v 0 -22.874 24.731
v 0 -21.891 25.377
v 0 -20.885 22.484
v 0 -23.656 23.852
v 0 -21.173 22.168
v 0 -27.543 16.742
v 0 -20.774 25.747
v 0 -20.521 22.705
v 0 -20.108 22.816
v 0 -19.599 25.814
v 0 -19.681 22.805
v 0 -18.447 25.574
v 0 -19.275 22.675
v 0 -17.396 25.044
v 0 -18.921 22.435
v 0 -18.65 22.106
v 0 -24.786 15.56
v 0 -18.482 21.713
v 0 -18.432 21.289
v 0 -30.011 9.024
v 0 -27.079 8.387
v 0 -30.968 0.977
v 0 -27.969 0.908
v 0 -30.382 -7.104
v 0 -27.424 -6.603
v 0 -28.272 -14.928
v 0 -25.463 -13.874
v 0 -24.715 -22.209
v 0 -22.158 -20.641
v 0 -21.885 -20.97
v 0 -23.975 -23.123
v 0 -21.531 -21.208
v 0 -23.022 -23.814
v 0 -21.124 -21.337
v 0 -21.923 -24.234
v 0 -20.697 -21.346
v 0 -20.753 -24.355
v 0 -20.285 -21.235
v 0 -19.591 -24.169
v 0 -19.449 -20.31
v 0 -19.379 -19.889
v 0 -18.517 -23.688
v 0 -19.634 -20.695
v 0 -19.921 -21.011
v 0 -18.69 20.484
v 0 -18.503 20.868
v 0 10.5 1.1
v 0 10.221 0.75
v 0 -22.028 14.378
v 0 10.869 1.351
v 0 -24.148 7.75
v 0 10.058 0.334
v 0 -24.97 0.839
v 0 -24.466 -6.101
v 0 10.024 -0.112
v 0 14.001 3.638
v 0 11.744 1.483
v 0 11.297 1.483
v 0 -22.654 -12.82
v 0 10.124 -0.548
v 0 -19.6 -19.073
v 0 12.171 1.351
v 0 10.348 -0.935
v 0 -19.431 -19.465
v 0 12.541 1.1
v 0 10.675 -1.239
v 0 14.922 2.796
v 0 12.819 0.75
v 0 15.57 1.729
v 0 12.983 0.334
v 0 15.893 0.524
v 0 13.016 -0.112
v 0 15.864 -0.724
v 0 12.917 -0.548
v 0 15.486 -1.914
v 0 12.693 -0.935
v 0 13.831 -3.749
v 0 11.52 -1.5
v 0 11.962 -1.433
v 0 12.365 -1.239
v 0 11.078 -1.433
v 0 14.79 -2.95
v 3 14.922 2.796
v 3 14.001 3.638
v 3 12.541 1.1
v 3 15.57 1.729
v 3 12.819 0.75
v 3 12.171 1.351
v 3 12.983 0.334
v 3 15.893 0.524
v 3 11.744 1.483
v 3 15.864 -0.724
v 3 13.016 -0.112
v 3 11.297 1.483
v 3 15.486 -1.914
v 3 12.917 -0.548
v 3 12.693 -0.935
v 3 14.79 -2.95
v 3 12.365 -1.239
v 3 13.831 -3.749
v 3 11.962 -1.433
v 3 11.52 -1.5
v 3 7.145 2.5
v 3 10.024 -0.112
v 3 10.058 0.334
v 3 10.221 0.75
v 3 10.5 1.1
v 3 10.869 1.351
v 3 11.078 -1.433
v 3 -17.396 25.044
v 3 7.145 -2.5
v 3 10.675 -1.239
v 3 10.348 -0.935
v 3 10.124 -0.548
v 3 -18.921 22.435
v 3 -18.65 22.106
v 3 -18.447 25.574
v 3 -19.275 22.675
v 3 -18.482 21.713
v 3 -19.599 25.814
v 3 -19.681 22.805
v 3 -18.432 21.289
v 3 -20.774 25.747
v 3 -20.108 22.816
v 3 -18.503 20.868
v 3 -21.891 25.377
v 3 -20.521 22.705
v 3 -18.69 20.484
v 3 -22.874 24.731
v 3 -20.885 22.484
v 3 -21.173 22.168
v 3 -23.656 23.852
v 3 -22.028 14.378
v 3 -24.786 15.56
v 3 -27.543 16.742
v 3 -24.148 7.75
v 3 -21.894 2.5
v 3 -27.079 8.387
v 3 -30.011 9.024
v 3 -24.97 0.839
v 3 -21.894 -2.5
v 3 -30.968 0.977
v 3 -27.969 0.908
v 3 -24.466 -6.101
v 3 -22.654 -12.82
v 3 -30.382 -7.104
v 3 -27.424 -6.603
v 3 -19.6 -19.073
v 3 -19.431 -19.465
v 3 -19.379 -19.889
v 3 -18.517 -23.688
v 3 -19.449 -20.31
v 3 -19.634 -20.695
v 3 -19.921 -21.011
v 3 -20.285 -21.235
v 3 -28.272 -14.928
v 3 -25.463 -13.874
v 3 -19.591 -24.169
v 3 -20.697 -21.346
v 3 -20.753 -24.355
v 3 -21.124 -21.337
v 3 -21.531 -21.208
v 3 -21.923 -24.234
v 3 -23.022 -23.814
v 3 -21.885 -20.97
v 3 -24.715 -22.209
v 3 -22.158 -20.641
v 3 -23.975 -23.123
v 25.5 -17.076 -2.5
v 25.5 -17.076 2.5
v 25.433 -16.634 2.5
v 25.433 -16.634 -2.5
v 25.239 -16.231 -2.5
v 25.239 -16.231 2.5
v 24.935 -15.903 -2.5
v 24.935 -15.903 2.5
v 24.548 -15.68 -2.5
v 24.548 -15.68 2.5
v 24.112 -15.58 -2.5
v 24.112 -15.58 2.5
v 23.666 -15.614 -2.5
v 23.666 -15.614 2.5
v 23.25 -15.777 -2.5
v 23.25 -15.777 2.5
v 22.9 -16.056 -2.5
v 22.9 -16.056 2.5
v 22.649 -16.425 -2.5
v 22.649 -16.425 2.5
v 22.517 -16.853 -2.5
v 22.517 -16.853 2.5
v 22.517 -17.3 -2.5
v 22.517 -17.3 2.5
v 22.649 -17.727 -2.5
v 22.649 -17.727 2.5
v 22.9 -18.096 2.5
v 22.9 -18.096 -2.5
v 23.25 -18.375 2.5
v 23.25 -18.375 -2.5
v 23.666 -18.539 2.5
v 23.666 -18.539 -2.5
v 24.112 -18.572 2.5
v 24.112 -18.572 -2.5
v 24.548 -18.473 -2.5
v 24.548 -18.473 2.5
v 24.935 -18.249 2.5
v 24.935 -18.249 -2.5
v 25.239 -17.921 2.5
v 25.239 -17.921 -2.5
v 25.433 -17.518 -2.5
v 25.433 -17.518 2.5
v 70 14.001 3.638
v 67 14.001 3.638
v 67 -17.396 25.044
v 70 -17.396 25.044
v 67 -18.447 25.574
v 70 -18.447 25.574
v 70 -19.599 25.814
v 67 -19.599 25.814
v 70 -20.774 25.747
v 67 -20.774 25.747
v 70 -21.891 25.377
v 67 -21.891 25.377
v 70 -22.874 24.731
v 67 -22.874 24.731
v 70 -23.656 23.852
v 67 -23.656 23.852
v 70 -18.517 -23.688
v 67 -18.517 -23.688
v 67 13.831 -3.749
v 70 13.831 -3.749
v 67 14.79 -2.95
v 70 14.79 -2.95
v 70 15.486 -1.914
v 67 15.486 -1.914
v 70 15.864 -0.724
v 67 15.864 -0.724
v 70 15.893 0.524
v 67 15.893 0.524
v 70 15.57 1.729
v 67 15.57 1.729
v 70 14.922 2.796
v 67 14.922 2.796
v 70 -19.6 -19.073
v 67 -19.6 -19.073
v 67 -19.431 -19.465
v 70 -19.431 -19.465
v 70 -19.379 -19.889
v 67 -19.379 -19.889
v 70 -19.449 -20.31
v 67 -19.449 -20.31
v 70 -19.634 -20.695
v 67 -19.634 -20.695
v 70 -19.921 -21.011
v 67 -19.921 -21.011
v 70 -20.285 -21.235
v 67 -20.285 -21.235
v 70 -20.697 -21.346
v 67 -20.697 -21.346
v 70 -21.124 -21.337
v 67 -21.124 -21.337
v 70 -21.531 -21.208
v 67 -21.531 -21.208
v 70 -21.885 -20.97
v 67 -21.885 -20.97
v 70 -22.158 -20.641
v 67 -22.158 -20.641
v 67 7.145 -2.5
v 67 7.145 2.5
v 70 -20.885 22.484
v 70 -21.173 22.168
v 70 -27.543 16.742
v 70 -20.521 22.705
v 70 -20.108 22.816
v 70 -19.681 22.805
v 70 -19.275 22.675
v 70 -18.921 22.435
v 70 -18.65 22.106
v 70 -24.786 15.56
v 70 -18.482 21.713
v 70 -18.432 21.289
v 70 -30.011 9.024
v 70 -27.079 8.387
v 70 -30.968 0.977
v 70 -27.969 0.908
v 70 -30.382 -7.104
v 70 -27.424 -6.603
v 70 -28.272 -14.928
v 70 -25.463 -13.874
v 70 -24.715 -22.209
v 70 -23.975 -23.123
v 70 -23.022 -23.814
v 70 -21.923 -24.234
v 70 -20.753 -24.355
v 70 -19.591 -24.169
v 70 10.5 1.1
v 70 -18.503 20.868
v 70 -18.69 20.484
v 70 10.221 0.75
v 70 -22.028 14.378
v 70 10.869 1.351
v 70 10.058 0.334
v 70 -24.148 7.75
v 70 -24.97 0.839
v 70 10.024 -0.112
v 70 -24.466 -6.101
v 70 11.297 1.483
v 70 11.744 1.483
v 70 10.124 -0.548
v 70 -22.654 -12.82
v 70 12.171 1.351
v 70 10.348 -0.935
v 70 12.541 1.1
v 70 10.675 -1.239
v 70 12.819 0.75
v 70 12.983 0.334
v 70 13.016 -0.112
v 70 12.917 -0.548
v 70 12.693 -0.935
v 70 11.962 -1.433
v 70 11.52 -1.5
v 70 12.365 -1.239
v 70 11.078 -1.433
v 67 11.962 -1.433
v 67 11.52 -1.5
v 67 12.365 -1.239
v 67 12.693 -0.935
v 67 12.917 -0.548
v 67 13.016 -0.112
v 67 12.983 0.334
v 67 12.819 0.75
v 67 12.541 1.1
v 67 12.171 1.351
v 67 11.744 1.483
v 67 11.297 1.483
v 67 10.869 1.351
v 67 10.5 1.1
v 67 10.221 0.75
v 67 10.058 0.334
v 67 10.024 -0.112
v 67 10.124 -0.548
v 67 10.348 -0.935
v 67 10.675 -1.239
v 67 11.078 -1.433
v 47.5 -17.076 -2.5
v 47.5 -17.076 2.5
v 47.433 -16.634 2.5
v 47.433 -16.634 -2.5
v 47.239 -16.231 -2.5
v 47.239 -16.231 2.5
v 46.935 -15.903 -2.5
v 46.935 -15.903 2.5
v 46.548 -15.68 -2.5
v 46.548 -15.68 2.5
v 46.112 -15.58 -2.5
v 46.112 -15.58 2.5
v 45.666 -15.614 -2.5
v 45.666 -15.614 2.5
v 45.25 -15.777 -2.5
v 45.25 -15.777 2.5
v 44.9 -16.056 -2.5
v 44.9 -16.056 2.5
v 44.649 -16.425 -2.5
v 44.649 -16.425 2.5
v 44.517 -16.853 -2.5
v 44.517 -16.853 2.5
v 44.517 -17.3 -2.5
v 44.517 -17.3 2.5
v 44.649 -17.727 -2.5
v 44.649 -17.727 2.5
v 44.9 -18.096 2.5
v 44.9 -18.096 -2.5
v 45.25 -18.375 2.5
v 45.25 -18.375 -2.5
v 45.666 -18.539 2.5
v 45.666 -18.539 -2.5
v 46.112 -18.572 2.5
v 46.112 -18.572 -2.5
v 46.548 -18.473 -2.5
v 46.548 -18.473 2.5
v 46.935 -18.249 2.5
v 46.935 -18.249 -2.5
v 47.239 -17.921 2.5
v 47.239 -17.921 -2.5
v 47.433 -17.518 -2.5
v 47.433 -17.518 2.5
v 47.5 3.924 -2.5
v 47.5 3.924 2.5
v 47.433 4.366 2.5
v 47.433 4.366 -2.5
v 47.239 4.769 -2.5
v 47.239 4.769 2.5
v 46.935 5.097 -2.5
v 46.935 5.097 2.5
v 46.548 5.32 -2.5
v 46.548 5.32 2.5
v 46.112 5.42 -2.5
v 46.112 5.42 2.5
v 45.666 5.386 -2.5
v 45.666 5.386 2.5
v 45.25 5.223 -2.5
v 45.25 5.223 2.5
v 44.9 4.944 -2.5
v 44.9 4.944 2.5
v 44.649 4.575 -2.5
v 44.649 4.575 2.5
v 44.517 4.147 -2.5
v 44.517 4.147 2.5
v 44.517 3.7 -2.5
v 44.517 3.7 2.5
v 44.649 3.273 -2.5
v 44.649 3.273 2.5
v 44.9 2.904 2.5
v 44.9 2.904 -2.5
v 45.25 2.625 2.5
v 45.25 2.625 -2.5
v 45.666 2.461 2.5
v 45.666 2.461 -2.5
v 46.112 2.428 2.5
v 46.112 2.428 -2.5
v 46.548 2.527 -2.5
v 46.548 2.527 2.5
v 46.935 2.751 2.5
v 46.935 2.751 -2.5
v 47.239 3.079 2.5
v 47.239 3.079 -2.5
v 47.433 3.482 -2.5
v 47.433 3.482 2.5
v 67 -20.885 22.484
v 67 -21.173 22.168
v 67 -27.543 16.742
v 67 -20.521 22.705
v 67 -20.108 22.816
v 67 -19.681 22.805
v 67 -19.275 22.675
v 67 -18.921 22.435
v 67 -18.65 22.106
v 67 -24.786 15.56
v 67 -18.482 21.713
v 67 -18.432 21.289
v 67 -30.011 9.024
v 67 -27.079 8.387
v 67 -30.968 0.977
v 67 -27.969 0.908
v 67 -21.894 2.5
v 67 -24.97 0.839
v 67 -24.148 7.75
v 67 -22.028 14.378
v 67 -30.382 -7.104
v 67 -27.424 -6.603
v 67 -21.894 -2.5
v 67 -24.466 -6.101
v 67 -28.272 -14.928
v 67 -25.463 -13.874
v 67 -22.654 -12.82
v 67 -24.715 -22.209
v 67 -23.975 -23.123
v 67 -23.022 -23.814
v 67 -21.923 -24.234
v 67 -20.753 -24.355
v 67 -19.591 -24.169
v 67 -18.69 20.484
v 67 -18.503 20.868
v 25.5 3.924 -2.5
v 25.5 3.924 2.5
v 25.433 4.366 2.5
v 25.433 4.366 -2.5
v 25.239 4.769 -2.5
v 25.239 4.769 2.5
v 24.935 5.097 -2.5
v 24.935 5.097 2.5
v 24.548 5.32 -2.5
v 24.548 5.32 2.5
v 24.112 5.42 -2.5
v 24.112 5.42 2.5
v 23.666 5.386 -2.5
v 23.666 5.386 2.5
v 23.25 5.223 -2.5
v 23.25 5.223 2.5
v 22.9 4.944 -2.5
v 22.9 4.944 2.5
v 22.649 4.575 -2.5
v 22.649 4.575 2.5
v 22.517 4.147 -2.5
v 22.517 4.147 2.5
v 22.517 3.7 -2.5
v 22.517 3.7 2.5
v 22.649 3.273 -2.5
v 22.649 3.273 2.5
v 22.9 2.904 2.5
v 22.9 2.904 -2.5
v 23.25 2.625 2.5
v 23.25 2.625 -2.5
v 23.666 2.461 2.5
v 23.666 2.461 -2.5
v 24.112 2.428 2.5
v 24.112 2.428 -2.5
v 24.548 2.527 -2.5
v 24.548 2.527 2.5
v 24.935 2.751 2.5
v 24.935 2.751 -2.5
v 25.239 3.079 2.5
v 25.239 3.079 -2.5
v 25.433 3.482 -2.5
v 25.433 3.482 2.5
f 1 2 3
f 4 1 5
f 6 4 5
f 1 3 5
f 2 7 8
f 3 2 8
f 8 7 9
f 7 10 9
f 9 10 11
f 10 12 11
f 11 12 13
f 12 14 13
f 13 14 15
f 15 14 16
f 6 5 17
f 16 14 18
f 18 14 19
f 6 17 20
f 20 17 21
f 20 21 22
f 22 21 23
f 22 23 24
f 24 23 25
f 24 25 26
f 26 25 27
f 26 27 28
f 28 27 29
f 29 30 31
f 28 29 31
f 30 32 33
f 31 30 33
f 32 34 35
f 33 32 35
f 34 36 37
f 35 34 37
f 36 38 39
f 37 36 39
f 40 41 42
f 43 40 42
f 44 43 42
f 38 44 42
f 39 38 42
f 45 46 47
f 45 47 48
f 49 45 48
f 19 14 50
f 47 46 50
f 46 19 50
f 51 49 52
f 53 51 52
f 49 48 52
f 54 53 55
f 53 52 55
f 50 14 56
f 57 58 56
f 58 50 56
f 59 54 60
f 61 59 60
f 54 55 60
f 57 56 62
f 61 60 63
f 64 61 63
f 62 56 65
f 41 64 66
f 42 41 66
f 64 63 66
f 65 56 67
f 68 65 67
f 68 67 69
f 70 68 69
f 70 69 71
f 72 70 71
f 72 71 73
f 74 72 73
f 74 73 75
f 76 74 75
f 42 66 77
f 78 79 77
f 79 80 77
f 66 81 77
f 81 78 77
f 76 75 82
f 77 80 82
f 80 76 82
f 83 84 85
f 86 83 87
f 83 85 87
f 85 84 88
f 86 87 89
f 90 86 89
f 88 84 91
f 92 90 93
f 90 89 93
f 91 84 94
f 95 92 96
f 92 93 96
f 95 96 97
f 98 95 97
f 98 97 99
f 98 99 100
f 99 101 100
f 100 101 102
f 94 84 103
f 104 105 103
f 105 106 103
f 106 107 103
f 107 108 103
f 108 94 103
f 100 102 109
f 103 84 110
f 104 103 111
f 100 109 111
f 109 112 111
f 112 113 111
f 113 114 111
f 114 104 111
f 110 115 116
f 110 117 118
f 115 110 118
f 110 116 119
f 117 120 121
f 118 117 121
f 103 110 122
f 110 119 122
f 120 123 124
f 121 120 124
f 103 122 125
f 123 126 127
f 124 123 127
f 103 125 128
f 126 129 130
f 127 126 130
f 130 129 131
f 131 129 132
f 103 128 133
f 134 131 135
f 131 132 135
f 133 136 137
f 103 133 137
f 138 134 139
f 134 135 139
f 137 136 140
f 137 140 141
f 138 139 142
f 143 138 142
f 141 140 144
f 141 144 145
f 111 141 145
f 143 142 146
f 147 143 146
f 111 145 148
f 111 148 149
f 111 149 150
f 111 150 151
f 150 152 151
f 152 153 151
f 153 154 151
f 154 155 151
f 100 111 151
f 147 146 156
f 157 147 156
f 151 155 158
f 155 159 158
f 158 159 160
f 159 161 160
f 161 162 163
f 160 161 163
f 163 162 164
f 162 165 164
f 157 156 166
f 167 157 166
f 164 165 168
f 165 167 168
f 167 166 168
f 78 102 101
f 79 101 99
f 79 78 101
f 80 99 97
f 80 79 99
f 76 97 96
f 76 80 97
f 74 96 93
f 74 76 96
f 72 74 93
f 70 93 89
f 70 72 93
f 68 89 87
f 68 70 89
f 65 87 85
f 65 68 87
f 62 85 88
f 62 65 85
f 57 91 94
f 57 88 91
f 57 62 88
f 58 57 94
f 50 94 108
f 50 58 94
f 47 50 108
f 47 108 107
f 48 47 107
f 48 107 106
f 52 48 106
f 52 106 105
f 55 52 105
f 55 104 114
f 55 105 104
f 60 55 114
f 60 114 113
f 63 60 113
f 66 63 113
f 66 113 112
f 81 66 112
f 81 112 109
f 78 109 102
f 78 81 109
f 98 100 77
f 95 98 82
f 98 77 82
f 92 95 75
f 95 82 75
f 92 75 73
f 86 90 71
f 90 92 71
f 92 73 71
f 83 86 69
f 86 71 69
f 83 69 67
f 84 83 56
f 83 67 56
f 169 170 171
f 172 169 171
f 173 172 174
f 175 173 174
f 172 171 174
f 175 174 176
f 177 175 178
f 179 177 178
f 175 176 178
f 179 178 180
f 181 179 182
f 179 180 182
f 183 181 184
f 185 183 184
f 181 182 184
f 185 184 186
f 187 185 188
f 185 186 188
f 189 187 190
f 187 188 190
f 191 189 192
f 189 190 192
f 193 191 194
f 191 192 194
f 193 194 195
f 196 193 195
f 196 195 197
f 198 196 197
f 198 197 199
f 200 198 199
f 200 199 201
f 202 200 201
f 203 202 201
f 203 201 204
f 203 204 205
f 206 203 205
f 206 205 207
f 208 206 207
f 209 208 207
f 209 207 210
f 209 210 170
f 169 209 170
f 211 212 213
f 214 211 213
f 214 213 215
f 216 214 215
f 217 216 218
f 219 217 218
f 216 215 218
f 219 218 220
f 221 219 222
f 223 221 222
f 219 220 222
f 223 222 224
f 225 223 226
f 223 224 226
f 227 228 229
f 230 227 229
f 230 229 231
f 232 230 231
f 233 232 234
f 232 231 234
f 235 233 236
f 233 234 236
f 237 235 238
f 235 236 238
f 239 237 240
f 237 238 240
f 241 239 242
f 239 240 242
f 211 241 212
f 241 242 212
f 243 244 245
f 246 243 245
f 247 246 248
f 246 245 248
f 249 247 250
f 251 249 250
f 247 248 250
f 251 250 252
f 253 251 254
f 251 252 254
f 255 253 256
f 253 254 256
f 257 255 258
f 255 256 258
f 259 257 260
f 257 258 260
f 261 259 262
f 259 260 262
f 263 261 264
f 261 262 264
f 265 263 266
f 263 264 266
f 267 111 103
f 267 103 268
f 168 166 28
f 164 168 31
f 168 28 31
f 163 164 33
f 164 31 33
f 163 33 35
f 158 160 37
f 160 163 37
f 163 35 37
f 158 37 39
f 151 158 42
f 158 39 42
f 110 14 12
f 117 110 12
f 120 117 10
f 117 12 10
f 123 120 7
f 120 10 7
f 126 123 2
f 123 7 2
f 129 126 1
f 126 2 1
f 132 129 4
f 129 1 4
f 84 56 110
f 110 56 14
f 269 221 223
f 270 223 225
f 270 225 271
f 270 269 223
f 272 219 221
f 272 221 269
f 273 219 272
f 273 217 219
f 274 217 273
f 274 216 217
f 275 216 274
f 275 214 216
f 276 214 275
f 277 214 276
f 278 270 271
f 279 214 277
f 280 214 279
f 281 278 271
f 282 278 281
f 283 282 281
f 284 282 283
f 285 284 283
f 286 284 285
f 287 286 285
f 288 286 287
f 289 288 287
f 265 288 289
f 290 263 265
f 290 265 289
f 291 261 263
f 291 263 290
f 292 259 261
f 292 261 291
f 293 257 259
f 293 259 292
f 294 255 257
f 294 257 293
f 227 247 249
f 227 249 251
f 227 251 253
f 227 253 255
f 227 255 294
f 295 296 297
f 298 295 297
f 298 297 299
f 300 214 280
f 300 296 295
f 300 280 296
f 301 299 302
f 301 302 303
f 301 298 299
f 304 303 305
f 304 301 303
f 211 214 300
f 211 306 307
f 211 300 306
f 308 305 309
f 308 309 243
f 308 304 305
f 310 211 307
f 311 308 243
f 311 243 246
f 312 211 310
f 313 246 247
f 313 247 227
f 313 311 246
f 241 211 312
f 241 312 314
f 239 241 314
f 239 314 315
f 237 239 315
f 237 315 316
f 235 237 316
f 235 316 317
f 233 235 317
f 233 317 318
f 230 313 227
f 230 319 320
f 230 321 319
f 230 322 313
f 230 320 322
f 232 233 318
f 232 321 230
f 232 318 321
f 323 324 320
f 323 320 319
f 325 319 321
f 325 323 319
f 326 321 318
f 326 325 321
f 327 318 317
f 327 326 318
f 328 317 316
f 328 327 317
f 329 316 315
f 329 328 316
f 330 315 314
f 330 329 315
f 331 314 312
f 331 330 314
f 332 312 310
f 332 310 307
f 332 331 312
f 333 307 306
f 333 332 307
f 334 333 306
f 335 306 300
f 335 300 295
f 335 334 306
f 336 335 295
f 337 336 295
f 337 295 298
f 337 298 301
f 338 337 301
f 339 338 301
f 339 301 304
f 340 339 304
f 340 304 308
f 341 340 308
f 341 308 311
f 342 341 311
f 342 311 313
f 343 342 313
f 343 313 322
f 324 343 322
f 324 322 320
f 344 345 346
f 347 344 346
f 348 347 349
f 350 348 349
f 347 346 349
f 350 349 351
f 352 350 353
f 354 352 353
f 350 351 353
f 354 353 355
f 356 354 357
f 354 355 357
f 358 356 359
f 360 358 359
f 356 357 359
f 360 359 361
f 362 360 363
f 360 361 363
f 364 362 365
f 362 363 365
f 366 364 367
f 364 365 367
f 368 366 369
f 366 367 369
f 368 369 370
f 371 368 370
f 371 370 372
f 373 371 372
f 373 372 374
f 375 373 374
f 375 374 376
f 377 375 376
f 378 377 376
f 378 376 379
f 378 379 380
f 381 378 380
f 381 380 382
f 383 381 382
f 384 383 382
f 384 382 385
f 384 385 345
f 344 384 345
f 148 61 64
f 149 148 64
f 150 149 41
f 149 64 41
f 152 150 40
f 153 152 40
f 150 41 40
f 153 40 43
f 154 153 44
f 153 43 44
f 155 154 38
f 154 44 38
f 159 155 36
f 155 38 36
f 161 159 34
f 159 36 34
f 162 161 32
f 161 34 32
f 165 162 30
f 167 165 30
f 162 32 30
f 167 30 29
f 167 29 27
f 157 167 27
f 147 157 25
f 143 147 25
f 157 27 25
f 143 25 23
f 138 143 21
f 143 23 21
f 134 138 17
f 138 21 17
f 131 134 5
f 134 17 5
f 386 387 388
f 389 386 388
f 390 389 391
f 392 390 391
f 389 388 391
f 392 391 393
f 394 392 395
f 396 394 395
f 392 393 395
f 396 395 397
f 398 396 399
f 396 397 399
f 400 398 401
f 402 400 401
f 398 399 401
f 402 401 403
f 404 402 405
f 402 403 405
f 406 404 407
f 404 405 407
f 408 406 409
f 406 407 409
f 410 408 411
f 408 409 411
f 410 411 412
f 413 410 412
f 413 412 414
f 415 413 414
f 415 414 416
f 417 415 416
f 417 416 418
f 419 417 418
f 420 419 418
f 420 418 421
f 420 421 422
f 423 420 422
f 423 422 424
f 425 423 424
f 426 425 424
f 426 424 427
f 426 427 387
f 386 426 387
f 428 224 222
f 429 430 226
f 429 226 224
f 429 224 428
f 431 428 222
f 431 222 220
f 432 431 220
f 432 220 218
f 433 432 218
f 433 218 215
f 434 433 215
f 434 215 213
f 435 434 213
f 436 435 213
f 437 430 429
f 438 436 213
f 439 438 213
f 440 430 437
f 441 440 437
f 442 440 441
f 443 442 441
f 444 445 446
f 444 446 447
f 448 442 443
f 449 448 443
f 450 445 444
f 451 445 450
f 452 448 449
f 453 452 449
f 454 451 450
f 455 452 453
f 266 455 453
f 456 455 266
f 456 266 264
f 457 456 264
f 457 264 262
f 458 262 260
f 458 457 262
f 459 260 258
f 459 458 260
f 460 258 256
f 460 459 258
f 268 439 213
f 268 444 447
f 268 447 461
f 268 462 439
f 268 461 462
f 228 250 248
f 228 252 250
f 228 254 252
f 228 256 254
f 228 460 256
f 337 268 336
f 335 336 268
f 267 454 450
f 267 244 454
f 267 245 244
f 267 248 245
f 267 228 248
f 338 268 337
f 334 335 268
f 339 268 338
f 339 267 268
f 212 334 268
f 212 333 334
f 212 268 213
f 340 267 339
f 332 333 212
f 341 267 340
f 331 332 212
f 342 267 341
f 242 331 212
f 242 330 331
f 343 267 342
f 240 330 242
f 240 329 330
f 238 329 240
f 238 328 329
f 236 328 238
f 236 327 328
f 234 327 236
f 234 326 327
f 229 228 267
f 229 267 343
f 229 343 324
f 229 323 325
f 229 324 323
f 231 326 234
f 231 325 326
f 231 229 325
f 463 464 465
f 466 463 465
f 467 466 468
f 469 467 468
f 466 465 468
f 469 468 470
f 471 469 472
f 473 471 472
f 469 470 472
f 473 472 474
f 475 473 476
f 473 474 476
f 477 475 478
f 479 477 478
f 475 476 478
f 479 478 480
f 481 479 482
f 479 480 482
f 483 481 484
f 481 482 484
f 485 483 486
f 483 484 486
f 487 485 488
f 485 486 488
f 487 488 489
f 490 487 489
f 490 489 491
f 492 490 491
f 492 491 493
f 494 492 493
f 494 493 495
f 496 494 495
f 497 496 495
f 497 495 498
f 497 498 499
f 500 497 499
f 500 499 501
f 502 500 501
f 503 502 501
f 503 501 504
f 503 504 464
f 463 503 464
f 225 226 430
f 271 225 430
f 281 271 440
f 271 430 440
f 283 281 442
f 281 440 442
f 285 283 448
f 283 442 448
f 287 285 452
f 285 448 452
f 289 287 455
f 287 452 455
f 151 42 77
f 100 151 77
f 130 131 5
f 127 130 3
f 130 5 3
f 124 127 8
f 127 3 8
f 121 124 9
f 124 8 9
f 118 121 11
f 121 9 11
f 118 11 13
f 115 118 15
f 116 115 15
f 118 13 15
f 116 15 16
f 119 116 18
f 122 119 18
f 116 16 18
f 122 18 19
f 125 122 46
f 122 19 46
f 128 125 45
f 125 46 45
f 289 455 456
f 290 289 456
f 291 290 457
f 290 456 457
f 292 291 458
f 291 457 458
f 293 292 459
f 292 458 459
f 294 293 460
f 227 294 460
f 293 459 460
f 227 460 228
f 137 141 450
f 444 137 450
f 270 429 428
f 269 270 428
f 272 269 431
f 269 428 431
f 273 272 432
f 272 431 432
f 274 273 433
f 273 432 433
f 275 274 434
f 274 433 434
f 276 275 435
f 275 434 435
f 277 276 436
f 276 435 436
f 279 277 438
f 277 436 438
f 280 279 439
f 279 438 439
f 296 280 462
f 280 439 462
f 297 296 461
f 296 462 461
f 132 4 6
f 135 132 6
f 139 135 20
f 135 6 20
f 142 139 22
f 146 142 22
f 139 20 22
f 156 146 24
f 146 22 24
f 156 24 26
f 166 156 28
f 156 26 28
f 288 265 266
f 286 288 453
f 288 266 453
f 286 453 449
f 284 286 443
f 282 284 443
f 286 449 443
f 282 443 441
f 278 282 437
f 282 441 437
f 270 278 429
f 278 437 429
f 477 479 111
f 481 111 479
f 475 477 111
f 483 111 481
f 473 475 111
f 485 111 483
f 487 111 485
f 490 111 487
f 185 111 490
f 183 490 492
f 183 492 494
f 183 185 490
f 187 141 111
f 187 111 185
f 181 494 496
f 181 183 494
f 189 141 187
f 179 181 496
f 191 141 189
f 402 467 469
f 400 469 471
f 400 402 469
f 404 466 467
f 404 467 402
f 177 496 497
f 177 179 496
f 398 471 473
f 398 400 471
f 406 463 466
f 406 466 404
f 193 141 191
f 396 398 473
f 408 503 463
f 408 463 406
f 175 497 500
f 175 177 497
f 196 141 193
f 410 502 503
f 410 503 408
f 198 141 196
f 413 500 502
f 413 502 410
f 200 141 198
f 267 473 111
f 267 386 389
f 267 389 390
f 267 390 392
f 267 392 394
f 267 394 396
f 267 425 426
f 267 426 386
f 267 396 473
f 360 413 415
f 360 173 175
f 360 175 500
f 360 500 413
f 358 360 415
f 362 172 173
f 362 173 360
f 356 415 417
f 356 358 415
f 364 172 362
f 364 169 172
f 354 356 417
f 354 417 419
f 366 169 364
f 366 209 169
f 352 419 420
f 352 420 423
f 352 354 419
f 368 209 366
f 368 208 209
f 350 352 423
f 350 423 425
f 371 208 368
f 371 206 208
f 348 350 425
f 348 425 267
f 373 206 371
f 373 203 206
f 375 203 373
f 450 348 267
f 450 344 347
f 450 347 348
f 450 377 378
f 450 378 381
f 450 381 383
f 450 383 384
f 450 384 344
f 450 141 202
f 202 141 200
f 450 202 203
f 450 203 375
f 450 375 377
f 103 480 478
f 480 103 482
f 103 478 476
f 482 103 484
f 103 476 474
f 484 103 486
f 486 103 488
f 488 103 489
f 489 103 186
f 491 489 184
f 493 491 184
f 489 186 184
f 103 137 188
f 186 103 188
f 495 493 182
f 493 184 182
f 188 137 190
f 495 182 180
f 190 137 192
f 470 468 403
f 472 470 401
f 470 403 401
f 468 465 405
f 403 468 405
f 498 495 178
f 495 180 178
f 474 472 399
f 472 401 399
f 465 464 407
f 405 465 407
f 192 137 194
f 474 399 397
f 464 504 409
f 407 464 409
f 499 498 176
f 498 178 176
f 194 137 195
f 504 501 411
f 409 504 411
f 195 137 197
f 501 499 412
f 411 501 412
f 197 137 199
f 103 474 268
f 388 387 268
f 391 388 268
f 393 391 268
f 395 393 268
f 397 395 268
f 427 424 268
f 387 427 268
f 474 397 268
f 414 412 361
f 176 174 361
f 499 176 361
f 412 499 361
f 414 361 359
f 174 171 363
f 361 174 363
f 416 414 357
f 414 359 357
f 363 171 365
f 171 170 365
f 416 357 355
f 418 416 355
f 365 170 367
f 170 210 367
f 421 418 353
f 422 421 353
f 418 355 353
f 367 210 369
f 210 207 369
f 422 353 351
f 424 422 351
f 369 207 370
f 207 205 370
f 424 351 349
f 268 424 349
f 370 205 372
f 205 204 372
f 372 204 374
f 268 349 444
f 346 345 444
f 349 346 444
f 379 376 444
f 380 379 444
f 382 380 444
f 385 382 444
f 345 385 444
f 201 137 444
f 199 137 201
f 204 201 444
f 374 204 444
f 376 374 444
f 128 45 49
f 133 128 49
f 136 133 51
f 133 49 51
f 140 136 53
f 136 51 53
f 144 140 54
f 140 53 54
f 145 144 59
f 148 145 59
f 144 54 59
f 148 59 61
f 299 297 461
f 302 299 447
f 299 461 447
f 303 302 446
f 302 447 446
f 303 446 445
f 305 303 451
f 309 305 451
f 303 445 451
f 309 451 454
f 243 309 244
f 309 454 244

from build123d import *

# Parameters (mm, degrees)
SKETCH_1_R               = 1.5
EXTRUDE_1_DEPTH          = 70
CUT_EXTRUDE_1_DEPTH      = 40
CUT_EXTRUDE_1_DEPTH_BACK = 48
SKETCH_3_W               = 64
SKETCH_3_H               = 30
SKETCH_4_R               = 1.5
CUT_EXTRUDE_2_DEPTH      = 10
CUT_EXTRUDE_4_DEPTH      = 17
CUT_EXTRUDE_4_DEPTH_BACK = 11
SKETCH_5_W               = 64
SKETCH_5_H               = 10
SKETCH_5_H_2             = 13


with BuildPart() as part:
    # 草图1 → 凸台-拉伸1 (new body)
    with BuildSketch(Plane(origin=(0, 0, 0), x_dir=(0, 0, -1), z_dir=(1, 0, 0))):
        with BuildLine():
            ThreePointArc((3.748616704, 13.830886654), (0.101280137, 15.922634297), (-3.638391548, 14.000830996))
            Line((-3.638391548, 14.000830996), (-25.044186814, -17.396344398))
            ThreePointArc((-25.044186814, -17.396344398), (-25.746563923, -20.773505291), (-23.851546095, -23.655771194))
            ThreePointArc((-23.851546095, -23.655771194), (-0.977489629, -30.968489282), (22.208659079, -24.715424983))
            ThreePointArc((22.208659079, -24.715424983), (24.234219774, -21.923355289), (23.687892423, -18.517466898))
            Line((23.687892423, -18.517466898), (3.748616704, 13.830886654))
        make_face()
        with BuildLine():
            ThreePointArc((20.640989027, -22.157611345), (-0.908490361, -27.96928287), (-22.167907547, -21.172756648))
            ThreePointArc((-22.167907547, -21.172756648), (-22.567595547, -19.0894301), (-20.484268999, -18.689742101))
            ThreePointArc((-20.484268999, -18.689742101), (-0.839491093, -24.970076458), (19.073318974, -19.599797708))
            ThreePointArc((19.073318974, -19.599797708), (21.136060819, -20.0948695), (20.640989027, -22.157611345))
        make_face(mode=Mode.SUBTRACT)
        with Locations((0, 11.52026822)):
            Circle(SKETCH_1_R, mode=Mode.SUBTRACT)
    extrude(amount=EXTRUDE_1_DEPTH)

    # 草图3 → 切除-拉伸1 (cut, two sides: drawn at the far end of the back side and taken through both)
    with BuildSketch(Plane(origin=(0, 0, 0), x_dir=(1, 0, 0), z_dir=(0, 1, 0)).offset(-CUT_EXTRUDE_1_DEPTH_BACK)):
        with Locations((35, 17.5)):
            Rectangle(SKETCH_3_W, SKETCH_3_H)
        with Locations((35, -17.5)):
            Rectangle(SKETCH_3_W, SKETCH_3_H)
    extrude(amount=CUT_EXTRUDE_1_DEPTH + CUT_EXTRUDE_1_DEPTH_BACK, mode=Mode.SUBTRACT)

    # 草图4 → 切除-拉伸2 (cut)
    with BuildSketch(Plane.XY.offset(2.5)):
        with Locations((24, 3.92379916)):
            Circle(SKETCH_4_R)
        with Locations((46, 3.92379916)):
            Circle(SKETCH_4_R)
        with Locations((46, -17.07620084)):
            Circle(SKETCH_4_R)
        with Locations((24, -17.07620084)):
            Circle(SKETCH_4_R)
    extrude(amount=-CUT_EXTRUDE_2_DEPTH, mode=Mode.SUBTRACT)

    # 草图5 → 切除-拉伸4 (cut, two sides: drawn at the far end of the back side and taken through both)
    with BuildSketch(Plane.XY.offset(2.5).offset(-CUT_EXTRUDE_4_DEPTH_BACK)):
        with Locations((35, -26.894014692)):
            Rectangle(SKETCH_5_W, SKETCH_5_H)
        with Locations((35, 13.645331632)):
            Rectangle(SKETCH_5_W, SKETCH_5_H_2)
    extrude(amount=CUT_EXTRUDE_4_DEPTH + CUT_EXTRUDE_4_DEPTH_BACK, mode=Mode.SUBTRACT)


solid = part.part
